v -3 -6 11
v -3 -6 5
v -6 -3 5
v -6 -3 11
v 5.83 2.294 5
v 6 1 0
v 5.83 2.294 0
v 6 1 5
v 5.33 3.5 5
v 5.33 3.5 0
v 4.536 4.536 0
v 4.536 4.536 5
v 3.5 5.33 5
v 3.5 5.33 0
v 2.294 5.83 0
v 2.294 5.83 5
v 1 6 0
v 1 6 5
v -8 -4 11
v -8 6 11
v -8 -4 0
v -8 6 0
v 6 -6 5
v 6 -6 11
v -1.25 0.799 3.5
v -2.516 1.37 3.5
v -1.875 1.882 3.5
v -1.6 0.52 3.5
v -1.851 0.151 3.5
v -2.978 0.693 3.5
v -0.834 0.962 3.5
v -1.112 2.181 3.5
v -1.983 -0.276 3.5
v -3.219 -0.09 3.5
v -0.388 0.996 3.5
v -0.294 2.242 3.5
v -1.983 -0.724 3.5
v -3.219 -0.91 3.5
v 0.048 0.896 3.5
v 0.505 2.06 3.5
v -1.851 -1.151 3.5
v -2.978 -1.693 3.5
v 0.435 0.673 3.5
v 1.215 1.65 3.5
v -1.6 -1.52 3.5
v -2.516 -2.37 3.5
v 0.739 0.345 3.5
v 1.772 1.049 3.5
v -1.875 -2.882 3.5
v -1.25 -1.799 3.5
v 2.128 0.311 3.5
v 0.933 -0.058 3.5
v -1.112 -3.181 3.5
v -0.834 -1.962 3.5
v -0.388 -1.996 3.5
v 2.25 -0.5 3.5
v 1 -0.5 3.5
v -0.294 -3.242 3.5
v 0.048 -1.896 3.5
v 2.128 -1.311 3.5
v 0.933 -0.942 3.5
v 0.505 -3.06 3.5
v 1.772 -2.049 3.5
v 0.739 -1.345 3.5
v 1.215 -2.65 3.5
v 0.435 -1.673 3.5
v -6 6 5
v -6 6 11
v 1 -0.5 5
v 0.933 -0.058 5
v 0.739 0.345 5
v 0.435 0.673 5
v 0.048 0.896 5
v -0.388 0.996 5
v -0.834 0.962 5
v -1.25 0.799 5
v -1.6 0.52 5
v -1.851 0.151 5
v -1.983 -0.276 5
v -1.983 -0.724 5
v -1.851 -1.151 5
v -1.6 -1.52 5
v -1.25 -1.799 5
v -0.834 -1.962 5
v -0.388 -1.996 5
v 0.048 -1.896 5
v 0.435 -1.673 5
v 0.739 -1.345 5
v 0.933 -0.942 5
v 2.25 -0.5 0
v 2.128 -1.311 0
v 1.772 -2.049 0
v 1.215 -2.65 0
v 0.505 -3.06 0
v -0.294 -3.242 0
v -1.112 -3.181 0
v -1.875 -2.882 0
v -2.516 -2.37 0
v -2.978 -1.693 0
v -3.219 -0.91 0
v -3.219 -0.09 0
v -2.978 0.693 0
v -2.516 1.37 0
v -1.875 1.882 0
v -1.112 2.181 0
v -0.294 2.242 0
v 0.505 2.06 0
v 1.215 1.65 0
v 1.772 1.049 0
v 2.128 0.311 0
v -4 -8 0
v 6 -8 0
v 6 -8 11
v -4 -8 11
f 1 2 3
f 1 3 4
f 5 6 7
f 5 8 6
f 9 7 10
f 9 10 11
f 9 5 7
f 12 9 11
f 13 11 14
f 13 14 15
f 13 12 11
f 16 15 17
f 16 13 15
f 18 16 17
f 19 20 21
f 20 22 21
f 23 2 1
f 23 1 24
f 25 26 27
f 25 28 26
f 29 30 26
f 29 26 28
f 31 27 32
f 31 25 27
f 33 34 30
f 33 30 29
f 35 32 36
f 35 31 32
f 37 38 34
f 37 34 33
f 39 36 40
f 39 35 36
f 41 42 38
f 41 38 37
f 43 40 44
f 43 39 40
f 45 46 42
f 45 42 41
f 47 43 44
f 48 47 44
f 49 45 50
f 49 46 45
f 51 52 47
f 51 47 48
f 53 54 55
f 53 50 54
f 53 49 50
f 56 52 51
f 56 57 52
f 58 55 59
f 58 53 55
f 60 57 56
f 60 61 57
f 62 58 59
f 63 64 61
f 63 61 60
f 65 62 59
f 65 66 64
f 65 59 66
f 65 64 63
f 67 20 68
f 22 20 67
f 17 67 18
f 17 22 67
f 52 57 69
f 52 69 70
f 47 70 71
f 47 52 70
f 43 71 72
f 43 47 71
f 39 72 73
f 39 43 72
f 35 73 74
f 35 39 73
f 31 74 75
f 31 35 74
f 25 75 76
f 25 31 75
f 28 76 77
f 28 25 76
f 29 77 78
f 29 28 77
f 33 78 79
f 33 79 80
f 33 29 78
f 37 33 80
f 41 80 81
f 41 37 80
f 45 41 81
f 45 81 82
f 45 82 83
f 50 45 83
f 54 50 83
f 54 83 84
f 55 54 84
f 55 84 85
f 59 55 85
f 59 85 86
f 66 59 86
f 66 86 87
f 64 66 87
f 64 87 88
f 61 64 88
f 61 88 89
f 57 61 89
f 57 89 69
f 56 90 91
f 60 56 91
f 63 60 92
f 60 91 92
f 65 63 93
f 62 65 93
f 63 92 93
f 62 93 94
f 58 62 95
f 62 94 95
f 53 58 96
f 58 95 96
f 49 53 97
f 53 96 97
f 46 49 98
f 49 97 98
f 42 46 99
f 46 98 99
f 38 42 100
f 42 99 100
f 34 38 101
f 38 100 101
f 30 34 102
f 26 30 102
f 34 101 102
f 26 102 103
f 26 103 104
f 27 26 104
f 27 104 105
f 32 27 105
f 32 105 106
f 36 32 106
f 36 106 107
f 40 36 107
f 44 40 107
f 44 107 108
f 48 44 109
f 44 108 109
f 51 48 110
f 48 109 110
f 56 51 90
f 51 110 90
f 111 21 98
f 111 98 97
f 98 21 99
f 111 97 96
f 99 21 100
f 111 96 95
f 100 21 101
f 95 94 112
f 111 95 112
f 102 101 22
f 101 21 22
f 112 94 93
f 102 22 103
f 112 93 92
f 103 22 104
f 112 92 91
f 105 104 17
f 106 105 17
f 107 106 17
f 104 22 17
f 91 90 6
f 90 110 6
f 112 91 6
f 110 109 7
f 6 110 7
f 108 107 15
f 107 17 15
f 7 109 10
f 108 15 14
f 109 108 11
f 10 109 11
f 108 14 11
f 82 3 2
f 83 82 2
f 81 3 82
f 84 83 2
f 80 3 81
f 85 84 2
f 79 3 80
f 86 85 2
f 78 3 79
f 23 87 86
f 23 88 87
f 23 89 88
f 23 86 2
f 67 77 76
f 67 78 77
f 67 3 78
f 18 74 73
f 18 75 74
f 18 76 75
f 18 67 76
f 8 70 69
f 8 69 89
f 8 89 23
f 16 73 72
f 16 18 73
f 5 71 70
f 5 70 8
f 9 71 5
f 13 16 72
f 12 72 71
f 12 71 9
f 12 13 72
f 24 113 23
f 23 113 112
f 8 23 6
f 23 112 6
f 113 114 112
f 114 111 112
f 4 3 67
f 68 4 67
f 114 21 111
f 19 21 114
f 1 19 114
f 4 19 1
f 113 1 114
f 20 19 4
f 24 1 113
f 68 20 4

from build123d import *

# Parameters (mm, degrees)
F0_W     = 12
F0_H     = 12
F0_R     = 1.5
F0_H_2   = 2
F1_DEPTH = 5
F2_W     = 2
F2_H     = 12
F2_W_2   = 12
F2_H_2   = 2
F3_DEPTH = 6
F4_R     = 2.75
F5_DEPTH = 3.5
F6_SIZE  = 3
F7_SIZE  = 4
F8_R     = 5


with BuildPart() as f1:
    # F0 (on Top) → F1 (new body)
    with BuildSketch(Plane.XY):
        Rectangle(F0_W, F0_H)
        with Locations((-0.5, -0.5)):
            Circle(F0_R, mode=Mode.SUBTRACT)
        with Locations((0, -7)):
            Rectangle(F0_W, F0_H_2)
        Polygon((-6, -8), (-6, -6), (-6, 6), (-8, 6), (-8, -8), align=None)
    extrude(amount=F1_DEPTH)

    # F2 (on face) → F3 (join)
    with BuildSketch(Plane.XY.offset(5)):
        with Locations((-7, 0)):
            Rectangle(F2_W, F2_H)
        with Locations((0, -7)):
            Rectangle(F2_W_2, F2_H_2)
        with Locations((-7, -7)):
            Rectangle(F2_W, F2_H_2)
    extrude(amount=F3_DEPTH)

    # F4 (on face) → F5 (cut)
    with BuildSketch(Plane(origin=(0, 0, 0), x_dir=(1, 0, 0), z_dir=(0, 0, -1))):
        with Locations((-0.5, 0.5)):
            Circle(F4_R)
    extrude(amount=-F5_DEPTH, mode=Mode.SUBTRACT)

    # F6
    f6_edges = [f1.edges().sort_by_distance(p)[0] for p in [
        (-6, -6, 8),
    ]]
    chamfer(f6_edges, length=F6_SIZE)

    # F7
    f7_edges = [f1.edges().sort_by_distance(p)[0] for p in [
        (-8, -8, 5.5),
    ]]
    chamfer(f7_edges, length=F7_SIZE)

    # F8
    f8_edges = [f1.edges().sort_by_distance(p)[0] for p in [
        (6, 6, 2.5),
    ]]
    fillet(f8_edges, radius=F8_R)


solid = f1.part
